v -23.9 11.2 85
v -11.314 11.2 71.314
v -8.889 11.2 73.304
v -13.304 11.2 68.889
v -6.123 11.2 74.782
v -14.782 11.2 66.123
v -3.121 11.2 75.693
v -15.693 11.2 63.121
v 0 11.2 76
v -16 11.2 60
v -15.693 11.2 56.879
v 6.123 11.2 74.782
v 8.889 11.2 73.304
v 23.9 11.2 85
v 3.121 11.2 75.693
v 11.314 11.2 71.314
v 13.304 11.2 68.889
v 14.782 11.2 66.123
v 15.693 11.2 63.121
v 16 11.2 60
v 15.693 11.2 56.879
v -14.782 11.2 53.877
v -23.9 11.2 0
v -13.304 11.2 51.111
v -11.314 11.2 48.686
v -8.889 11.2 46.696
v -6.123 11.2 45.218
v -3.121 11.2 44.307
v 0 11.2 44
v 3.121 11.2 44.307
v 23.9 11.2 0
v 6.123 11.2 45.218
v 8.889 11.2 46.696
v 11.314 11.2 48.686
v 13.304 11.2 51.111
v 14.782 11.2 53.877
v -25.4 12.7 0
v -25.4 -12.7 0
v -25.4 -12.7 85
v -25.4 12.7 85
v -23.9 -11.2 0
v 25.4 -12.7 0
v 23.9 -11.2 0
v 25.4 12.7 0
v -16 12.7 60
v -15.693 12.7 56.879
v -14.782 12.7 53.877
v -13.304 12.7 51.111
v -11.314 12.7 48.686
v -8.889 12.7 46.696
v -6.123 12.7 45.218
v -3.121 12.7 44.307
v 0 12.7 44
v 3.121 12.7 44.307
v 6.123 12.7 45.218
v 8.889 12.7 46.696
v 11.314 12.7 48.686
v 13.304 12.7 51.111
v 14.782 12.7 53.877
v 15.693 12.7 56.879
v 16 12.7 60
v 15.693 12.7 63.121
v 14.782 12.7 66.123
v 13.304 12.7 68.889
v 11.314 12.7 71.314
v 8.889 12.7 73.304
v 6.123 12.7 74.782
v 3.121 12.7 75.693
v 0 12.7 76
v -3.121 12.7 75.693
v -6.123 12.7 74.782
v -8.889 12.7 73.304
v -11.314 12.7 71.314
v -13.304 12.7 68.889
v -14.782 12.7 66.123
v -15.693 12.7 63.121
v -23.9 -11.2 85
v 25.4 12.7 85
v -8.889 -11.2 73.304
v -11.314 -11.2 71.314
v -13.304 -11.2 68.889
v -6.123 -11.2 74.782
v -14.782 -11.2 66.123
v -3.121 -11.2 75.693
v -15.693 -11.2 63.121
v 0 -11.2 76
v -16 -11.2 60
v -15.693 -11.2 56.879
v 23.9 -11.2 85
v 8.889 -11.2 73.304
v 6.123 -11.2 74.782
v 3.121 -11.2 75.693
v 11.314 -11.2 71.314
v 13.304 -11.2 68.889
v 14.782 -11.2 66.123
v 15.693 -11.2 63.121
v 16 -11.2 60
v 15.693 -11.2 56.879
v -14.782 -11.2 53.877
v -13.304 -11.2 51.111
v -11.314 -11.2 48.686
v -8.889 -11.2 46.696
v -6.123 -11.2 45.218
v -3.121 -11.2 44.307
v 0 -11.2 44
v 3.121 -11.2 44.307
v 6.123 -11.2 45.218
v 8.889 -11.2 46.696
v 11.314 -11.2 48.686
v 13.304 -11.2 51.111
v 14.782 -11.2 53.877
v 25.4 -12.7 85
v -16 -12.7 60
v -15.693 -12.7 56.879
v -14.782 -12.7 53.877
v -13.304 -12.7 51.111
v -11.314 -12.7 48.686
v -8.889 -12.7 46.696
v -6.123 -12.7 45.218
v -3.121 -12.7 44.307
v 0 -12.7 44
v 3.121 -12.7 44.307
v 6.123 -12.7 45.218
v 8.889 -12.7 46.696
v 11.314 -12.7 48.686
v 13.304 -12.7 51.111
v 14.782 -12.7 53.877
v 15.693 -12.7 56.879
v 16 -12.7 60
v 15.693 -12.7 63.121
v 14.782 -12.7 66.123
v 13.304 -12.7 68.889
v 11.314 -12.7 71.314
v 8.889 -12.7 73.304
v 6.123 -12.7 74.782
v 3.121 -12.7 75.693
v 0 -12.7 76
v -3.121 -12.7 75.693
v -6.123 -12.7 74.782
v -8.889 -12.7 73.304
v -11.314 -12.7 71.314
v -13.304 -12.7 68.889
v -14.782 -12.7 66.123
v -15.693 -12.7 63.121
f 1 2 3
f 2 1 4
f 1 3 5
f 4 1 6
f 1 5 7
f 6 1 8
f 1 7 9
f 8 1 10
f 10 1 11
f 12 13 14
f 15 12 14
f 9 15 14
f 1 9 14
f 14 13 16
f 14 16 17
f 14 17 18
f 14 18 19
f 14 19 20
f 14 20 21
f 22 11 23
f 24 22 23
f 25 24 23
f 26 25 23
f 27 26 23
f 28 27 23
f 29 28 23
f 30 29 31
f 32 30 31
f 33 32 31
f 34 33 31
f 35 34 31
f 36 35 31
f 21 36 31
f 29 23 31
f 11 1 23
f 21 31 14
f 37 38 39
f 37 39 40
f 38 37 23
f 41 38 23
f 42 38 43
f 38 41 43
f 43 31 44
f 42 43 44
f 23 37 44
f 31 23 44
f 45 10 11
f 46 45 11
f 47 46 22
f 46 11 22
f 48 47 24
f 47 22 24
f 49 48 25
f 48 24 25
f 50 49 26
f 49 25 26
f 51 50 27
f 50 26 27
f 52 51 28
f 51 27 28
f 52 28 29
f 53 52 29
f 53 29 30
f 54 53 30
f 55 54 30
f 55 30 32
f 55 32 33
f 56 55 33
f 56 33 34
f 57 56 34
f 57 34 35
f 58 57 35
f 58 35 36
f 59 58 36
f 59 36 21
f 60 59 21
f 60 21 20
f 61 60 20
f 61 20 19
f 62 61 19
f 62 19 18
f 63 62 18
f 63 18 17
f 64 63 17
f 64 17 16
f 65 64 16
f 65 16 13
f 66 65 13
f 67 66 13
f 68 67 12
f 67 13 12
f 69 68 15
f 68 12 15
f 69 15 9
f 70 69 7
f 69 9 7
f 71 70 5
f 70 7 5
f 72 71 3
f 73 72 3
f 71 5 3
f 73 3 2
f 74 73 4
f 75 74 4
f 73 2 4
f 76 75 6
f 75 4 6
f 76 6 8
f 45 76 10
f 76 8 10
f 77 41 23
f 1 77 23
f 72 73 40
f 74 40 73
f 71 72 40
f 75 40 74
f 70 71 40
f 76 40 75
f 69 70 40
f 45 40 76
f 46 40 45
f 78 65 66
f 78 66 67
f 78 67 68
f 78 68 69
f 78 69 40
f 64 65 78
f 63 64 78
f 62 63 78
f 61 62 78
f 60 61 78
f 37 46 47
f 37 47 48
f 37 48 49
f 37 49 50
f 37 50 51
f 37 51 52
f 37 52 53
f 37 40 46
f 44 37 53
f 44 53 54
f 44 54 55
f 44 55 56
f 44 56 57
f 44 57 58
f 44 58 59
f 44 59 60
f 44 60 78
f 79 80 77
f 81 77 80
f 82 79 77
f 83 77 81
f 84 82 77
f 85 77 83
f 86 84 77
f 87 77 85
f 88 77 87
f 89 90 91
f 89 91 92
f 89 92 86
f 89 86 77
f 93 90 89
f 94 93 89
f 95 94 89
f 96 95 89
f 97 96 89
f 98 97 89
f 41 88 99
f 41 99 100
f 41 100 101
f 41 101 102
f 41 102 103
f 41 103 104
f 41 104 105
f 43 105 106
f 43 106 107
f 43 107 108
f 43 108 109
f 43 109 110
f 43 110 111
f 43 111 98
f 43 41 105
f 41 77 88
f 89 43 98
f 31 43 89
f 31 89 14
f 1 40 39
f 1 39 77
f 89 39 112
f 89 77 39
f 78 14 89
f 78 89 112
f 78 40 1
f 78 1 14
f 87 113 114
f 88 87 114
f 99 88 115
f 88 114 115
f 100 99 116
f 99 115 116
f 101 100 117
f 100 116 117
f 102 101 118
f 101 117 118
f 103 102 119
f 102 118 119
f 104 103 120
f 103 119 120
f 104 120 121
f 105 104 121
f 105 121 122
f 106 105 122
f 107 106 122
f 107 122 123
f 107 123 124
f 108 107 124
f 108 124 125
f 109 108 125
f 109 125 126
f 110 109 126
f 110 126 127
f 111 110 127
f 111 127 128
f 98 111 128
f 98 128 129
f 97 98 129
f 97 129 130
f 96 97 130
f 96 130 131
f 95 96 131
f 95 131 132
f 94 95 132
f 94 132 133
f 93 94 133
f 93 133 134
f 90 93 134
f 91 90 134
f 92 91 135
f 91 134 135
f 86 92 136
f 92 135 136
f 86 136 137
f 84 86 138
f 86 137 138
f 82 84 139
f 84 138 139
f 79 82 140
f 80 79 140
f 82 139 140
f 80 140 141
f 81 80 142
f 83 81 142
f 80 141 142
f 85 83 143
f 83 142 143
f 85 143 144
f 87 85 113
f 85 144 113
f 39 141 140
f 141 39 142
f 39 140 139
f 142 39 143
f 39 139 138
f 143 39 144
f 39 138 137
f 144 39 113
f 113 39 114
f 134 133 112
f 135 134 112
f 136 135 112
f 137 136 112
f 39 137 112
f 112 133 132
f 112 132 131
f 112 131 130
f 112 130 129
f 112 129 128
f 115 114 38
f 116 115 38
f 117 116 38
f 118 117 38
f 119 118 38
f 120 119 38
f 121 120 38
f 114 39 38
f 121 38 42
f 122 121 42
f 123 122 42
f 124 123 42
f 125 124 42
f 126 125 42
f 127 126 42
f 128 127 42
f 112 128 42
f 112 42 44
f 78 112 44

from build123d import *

# Parameters (mm, degrees)
CROQUIS1_W              = 50.8
CROQUIS1_H              = 25.4
CROQUIS1_W_2            = 47.8
CROQUIS1_H_2            = 22.4
SALIENTE_EXTRUIR1_DEPTH = 85
CROQUIS2_R              = 16
CORTAR_EXTRUIR1_DEPTH   = 26


with BuildPart() as part:
    # Croquis1 → Saliente-Extruir1 (new body)
    with BuildSketch(Plane.XY):
        Rectangle(CROQUIS1_W, CROQUIS1_H)
        Rectangle(CROQUIS1_W_2, CROQUIS1_H_2, mode=Mode.SUBTRACT)
    extrude(amount=SALIENTE_EXTRUIR1_DEPTH)

    # Croquis2 → Cortar-Extruir1 (cut)
    with BuildSketch(Plane(origin=(0, -12.7, 0), x_dir=(-1, 0, 0), z_dir=(0, -1, 0))):
        with Locations((0, -60)):
            Circle(CROQUIS2_R)
    extrude(amount=-CORTAR_EXTRUIR1_DEPTH, mode=Mode.SUBTRACT)


solid = part.part
